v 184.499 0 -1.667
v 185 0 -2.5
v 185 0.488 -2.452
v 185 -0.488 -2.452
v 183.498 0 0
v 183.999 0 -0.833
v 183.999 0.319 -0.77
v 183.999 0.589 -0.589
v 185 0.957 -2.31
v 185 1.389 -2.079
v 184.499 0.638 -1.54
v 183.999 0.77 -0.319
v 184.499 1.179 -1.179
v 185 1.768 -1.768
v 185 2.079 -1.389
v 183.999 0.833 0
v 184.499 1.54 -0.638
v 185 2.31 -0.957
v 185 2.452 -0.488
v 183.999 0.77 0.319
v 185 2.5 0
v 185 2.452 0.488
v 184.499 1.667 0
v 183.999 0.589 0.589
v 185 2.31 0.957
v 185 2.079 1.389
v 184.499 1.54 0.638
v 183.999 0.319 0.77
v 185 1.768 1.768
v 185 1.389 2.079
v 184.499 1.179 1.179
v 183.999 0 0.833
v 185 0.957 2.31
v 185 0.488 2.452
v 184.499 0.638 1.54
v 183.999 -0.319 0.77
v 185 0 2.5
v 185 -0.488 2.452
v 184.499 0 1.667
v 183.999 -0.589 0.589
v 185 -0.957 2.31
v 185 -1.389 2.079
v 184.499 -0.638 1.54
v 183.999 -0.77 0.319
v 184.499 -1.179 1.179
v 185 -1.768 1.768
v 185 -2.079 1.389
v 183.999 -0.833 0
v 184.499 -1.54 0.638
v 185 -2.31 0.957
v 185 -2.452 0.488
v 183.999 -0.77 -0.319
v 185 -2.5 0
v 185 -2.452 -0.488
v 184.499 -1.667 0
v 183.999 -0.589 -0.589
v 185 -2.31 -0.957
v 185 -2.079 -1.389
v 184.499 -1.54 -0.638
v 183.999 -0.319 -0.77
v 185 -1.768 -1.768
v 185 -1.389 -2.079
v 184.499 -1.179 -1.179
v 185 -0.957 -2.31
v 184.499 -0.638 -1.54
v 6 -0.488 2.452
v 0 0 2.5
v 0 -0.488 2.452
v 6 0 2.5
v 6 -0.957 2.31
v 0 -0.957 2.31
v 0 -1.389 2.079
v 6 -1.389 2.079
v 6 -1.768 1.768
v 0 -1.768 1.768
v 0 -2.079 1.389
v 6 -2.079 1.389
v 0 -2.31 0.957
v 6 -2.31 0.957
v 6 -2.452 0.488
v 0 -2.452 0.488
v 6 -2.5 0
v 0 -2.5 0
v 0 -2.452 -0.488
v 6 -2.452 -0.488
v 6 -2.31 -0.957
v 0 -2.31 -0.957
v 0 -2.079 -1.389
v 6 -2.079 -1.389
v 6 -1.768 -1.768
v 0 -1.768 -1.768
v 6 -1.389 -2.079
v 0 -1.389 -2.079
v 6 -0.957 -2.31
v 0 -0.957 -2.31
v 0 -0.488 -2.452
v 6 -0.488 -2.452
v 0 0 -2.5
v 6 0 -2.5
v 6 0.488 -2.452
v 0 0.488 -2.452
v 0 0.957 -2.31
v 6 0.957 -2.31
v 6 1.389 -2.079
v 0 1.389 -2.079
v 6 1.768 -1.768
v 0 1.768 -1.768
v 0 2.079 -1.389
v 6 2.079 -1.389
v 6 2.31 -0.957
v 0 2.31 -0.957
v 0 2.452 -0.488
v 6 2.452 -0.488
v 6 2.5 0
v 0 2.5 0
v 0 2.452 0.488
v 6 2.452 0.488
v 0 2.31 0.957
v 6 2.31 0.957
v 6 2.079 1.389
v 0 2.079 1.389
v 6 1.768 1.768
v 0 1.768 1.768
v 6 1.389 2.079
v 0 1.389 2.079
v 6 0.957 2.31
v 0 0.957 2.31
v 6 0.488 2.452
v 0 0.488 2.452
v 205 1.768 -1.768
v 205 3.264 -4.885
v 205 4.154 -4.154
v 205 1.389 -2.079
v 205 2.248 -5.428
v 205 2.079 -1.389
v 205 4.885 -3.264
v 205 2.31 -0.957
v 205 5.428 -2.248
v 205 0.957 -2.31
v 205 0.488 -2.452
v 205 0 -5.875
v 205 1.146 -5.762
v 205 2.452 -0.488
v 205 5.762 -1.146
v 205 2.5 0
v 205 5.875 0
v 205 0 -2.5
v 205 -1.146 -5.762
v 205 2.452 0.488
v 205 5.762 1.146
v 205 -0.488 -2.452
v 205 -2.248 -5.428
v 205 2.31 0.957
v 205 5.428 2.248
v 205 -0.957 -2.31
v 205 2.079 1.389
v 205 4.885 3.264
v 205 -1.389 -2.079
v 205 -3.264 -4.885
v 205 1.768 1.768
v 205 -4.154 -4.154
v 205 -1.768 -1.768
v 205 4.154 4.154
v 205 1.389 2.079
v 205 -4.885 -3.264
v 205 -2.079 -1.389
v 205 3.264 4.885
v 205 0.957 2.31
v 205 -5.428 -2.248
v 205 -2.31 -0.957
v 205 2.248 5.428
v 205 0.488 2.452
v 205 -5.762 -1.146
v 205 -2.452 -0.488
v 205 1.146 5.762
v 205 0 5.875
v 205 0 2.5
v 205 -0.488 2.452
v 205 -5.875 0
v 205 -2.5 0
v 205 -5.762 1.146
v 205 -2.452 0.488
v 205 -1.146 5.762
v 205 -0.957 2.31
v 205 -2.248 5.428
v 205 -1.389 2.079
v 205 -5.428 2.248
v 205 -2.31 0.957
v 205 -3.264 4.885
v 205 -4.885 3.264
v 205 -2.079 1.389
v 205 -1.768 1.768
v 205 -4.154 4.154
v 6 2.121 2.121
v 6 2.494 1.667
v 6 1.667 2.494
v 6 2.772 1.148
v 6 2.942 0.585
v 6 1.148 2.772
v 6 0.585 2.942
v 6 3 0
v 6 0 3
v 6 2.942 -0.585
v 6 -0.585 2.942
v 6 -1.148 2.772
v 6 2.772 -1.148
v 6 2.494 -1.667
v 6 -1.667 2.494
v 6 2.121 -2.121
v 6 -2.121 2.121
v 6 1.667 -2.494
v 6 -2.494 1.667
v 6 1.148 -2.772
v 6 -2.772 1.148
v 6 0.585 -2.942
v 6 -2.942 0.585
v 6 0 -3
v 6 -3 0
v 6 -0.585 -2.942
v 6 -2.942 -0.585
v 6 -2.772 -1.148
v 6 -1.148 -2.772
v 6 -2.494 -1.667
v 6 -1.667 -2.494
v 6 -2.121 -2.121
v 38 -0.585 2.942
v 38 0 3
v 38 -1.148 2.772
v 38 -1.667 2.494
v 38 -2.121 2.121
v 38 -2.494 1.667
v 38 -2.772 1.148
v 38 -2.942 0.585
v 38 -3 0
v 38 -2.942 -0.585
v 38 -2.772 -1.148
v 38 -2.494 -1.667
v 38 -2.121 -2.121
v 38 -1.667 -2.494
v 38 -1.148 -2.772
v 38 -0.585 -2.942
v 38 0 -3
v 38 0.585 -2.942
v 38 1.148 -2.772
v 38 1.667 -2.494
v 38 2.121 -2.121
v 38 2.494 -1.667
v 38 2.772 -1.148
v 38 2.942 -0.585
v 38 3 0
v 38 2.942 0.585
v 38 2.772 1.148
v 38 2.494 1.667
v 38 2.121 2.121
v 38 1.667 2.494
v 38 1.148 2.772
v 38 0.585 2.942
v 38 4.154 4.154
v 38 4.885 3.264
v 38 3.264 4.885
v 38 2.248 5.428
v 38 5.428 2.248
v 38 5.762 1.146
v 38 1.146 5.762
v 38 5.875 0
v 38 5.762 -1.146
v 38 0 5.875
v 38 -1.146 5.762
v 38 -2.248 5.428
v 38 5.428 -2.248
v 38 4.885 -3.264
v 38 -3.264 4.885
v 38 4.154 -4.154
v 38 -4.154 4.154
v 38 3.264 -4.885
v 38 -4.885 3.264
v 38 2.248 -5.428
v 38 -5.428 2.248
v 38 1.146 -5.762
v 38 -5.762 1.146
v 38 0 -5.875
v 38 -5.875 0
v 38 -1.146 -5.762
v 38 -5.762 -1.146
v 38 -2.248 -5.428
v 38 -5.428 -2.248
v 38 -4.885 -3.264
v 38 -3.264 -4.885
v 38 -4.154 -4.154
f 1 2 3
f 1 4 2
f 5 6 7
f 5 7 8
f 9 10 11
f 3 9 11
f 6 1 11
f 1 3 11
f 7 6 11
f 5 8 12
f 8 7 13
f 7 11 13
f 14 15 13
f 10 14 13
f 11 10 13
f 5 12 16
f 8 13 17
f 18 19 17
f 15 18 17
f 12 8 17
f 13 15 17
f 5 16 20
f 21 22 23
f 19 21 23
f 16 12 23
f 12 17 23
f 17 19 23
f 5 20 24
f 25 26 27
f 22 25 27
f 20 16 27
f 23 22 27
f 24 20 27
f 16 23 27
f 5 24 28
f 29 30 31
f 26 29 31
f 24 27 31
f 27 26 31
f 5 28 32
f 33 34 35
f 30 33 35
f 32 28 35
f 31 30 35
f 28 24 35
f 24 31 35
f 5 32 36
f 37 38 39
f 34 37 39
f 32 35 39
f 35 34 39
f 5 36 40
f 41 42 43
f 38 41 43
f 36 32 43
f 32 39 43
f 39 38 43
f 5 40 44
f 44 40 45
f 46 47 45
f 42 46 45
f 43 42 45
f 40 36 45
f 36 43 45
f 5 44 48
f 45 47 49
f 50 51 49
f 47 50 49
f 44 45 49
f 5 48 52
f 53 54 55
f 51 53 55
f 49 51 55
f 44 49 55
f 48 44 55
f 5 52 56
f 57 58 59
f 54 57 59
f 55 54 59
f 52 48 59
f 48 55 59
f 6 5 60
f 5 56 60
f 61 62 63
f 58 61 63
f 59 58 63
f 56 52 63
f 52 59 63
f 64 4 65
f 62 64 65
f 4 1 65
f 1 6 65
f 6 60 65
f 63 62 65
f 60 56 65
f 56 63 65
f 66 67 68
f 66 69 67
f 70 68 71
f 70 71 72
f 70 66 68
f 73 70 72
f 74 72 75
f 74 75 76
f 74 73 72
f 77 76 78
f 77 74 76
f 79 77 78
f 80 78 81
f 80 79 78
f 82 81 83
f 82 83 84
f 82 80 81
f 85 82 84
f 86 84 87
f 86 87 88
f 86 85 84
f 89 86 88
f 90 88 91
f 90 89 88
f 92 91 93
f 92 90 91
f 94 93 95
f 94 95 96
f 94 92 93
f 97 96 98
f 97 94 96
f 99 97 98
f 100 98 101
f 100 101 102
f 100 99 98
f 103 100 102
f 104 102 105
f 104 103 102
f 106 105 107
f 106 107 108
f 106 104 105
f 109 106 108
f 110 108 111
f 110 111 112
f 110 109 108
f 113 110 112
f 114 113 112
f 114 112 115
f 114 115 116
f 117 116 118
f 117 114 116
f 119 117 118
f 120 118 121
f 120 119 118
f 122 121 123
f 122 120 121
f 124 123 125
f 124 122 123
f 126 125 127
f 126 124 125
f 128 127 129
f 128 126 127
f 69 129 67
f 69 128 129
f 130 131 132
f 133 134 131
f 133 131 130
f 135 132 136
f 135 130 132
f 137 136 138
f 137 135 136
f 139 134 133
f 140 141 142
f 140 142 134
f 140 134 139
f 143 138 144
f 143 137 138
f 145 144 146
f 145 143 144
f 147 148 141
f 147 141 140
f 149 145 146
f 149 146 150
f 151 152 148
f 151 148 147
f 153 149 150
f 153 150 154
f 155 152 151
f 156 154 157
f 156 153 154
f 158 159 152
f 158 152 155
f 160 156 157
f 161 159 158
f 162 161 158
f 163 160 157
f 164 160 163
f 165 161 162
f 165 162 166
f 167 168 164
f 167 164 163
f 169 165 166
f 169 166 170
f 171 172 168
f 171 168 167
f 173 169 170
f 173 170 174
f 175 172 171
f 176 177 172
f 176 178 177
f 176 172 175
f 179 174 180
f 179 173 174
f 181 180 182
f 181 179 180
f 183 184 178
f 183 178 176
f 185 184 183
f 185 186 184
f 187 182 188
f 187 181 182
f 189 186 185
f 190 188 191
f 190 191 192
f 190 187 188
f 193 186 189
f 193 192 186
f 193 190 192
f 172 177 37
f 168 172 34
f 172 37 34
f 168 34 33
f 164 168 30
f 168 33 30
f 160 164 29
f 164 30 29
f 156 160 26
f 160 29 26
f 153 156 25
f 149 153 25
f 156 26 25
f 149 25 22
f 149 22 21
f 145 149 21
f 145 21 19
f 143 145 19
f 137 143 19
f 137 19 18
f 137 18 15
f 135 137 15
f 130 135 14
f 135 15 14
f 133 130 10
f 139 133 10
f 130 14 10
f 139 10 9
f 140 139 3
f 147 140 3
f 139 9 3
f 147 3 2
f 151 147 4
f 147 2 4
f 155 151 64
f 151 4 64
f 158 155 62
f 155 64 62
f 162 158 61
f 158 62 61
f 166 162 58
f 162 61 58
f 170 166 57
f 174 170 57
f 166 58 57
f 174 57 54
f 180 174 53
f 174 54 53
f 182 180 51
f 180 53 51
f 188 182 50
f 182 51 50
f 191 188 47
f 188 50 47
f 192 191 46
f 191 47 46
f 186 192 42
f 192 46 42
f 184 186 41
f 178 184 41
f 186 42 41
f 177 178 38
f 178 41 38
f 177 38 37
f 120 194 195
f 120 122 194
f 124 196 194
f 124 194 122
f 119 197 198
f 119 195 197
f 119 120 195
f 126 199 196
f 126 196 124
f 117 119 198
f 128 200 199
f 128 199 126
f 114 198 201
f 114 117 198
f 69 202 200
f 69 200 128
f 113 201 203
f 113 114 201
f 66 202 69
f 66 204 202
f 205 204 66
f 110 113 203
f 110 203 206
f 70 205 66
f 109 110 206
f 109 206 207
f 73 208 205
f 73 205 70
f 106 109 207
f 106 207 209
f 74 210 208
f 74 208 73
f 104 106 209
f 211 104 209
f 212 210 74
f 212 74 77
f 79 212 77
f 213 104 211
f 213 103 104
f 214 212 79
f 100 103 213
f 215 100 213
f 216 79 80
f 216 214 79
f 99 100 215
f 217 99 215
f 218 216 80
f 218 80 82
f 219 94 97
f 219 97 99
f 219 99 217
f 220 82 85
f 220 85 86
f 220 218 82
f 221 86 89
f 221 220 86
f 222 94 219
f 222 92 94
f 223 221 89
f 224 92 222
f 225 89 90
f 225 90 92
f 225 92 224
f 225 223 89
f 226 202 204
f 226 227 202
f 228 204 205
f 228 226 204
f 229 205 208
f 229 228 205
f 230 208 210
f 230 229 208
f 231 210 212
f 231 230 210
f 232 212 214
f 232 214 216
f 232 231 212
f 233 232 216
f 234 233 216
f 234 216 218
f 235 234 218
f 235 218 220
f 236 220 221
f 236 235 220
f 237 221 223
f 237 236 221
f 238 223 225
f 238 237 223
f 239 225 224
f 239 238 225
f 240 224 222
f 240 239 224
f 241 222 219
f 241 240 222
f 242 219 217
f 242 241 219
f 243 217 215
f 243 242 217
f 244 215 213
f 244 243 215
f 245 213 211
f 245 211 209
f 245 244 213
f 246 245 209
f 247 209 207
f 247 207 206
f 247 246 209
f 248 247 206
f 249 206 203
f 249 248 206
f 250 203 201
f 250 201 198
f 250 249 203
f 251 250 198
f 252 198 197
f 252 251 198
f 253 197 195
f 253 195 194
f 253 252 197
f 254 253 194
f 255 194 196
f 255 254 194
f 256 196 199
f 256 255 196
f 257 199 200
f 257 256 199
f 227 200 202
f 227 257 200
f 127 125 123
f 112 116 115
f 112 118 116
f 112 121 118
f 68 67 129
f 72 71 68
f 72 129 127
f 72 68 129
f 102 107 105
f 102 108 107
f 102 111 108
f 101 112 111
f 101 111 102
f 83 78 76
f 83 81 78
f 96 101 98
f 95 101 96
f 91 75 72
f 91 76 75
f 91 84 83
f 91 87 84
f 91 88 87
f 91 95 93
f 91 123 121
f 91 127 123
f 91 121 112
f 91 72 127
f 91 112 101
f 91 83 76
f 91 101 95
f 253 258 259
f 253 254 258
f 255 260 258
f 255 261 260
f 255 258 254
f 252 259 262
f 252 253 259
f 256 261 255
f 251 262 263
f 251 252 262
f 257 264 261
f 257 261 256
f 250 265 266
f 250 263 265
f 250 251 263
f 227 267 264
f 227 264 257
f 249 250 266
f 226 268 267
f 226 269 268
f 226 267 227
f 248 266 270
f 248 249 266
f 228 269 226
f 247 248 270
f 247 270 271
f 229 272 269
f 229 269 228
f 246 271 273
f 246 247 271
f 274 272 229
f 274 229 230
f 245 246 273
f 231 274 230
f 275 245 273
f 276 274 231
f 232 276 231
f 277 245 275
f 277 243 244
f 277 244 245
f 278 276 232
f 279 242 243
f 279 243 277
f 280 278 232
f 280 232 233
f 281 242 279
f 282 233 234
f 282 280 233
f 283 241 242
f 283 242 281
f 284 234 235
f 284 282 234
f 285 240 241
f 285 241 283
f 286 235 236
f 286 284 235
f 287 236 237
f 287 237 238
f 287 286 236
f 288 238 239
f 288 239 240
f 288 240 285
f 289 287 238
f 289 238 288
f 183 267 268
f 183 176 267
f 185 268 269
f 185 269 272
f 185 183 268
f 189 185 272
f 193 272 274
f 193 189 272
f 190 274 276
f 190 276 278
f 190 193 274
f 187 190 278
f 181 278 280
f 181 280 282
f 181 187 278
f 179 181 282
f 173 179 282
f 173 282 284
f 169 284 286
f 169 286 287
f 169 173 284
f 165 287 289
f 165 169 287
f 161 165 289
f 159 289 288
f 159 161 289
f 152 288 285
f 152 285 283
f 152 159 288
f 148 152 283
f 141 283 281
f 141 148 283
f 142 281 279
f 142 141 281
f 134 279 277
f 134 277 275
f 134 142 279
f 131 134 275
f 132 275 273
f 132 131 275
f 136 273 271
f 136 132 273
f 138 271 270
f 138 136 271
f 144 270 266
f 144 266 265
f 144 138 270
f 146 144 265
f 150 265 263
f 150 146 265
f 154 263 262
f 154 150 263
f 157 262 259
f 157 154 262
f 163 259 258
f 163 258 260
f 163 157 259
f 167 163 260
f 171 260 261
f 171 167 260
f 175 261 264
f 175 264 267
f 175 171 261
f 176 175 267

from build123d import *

# Parameters (mm, degrees)
PER_AGE1_D     = 5
PER_AGE1_DEPTH = 20
PER_AGE1_TIP   = 1.502151548


with BuildPart() as part:
    # Esquisse1 → Base-Révolution (revolve)
    with BuildSketch(Plane.XY, mode=Mode.PRIVATE) as base_r_volution_sk:
        Polygon((0, 0), (0, 2.5), (6, 2.5), (6, 3), (38, 3), (38, 5.875), (205, 5.875), (205, 0), align=None)
    revolve(base_r_volution_sk.sketch.rotate(Axis((0, 0, 0), (1, 0, 0)), 90), axis=Axis((0, 0, 0), (1, 0, 0)))

    # Perçage1
    with Locations(Plane(origin=(205, 0, 0), x_dir=(0, 0, -1), z_dir=(1, 0, 0))):
        with Locations((0, 0)):
            Hole(PER_AGE1_D / 2, depth=PER_AGE1_DEPTH)
            with Locations((0, 0, -(PER_AGE1_DEPTH + PER_AGE1_TIP / 2))):  # 118° drill point
                Cone(0, PER_AGE1_D / 2, PER_AGE1_TIP, mode=Mode.SUBTRACT)


solid = part.part
